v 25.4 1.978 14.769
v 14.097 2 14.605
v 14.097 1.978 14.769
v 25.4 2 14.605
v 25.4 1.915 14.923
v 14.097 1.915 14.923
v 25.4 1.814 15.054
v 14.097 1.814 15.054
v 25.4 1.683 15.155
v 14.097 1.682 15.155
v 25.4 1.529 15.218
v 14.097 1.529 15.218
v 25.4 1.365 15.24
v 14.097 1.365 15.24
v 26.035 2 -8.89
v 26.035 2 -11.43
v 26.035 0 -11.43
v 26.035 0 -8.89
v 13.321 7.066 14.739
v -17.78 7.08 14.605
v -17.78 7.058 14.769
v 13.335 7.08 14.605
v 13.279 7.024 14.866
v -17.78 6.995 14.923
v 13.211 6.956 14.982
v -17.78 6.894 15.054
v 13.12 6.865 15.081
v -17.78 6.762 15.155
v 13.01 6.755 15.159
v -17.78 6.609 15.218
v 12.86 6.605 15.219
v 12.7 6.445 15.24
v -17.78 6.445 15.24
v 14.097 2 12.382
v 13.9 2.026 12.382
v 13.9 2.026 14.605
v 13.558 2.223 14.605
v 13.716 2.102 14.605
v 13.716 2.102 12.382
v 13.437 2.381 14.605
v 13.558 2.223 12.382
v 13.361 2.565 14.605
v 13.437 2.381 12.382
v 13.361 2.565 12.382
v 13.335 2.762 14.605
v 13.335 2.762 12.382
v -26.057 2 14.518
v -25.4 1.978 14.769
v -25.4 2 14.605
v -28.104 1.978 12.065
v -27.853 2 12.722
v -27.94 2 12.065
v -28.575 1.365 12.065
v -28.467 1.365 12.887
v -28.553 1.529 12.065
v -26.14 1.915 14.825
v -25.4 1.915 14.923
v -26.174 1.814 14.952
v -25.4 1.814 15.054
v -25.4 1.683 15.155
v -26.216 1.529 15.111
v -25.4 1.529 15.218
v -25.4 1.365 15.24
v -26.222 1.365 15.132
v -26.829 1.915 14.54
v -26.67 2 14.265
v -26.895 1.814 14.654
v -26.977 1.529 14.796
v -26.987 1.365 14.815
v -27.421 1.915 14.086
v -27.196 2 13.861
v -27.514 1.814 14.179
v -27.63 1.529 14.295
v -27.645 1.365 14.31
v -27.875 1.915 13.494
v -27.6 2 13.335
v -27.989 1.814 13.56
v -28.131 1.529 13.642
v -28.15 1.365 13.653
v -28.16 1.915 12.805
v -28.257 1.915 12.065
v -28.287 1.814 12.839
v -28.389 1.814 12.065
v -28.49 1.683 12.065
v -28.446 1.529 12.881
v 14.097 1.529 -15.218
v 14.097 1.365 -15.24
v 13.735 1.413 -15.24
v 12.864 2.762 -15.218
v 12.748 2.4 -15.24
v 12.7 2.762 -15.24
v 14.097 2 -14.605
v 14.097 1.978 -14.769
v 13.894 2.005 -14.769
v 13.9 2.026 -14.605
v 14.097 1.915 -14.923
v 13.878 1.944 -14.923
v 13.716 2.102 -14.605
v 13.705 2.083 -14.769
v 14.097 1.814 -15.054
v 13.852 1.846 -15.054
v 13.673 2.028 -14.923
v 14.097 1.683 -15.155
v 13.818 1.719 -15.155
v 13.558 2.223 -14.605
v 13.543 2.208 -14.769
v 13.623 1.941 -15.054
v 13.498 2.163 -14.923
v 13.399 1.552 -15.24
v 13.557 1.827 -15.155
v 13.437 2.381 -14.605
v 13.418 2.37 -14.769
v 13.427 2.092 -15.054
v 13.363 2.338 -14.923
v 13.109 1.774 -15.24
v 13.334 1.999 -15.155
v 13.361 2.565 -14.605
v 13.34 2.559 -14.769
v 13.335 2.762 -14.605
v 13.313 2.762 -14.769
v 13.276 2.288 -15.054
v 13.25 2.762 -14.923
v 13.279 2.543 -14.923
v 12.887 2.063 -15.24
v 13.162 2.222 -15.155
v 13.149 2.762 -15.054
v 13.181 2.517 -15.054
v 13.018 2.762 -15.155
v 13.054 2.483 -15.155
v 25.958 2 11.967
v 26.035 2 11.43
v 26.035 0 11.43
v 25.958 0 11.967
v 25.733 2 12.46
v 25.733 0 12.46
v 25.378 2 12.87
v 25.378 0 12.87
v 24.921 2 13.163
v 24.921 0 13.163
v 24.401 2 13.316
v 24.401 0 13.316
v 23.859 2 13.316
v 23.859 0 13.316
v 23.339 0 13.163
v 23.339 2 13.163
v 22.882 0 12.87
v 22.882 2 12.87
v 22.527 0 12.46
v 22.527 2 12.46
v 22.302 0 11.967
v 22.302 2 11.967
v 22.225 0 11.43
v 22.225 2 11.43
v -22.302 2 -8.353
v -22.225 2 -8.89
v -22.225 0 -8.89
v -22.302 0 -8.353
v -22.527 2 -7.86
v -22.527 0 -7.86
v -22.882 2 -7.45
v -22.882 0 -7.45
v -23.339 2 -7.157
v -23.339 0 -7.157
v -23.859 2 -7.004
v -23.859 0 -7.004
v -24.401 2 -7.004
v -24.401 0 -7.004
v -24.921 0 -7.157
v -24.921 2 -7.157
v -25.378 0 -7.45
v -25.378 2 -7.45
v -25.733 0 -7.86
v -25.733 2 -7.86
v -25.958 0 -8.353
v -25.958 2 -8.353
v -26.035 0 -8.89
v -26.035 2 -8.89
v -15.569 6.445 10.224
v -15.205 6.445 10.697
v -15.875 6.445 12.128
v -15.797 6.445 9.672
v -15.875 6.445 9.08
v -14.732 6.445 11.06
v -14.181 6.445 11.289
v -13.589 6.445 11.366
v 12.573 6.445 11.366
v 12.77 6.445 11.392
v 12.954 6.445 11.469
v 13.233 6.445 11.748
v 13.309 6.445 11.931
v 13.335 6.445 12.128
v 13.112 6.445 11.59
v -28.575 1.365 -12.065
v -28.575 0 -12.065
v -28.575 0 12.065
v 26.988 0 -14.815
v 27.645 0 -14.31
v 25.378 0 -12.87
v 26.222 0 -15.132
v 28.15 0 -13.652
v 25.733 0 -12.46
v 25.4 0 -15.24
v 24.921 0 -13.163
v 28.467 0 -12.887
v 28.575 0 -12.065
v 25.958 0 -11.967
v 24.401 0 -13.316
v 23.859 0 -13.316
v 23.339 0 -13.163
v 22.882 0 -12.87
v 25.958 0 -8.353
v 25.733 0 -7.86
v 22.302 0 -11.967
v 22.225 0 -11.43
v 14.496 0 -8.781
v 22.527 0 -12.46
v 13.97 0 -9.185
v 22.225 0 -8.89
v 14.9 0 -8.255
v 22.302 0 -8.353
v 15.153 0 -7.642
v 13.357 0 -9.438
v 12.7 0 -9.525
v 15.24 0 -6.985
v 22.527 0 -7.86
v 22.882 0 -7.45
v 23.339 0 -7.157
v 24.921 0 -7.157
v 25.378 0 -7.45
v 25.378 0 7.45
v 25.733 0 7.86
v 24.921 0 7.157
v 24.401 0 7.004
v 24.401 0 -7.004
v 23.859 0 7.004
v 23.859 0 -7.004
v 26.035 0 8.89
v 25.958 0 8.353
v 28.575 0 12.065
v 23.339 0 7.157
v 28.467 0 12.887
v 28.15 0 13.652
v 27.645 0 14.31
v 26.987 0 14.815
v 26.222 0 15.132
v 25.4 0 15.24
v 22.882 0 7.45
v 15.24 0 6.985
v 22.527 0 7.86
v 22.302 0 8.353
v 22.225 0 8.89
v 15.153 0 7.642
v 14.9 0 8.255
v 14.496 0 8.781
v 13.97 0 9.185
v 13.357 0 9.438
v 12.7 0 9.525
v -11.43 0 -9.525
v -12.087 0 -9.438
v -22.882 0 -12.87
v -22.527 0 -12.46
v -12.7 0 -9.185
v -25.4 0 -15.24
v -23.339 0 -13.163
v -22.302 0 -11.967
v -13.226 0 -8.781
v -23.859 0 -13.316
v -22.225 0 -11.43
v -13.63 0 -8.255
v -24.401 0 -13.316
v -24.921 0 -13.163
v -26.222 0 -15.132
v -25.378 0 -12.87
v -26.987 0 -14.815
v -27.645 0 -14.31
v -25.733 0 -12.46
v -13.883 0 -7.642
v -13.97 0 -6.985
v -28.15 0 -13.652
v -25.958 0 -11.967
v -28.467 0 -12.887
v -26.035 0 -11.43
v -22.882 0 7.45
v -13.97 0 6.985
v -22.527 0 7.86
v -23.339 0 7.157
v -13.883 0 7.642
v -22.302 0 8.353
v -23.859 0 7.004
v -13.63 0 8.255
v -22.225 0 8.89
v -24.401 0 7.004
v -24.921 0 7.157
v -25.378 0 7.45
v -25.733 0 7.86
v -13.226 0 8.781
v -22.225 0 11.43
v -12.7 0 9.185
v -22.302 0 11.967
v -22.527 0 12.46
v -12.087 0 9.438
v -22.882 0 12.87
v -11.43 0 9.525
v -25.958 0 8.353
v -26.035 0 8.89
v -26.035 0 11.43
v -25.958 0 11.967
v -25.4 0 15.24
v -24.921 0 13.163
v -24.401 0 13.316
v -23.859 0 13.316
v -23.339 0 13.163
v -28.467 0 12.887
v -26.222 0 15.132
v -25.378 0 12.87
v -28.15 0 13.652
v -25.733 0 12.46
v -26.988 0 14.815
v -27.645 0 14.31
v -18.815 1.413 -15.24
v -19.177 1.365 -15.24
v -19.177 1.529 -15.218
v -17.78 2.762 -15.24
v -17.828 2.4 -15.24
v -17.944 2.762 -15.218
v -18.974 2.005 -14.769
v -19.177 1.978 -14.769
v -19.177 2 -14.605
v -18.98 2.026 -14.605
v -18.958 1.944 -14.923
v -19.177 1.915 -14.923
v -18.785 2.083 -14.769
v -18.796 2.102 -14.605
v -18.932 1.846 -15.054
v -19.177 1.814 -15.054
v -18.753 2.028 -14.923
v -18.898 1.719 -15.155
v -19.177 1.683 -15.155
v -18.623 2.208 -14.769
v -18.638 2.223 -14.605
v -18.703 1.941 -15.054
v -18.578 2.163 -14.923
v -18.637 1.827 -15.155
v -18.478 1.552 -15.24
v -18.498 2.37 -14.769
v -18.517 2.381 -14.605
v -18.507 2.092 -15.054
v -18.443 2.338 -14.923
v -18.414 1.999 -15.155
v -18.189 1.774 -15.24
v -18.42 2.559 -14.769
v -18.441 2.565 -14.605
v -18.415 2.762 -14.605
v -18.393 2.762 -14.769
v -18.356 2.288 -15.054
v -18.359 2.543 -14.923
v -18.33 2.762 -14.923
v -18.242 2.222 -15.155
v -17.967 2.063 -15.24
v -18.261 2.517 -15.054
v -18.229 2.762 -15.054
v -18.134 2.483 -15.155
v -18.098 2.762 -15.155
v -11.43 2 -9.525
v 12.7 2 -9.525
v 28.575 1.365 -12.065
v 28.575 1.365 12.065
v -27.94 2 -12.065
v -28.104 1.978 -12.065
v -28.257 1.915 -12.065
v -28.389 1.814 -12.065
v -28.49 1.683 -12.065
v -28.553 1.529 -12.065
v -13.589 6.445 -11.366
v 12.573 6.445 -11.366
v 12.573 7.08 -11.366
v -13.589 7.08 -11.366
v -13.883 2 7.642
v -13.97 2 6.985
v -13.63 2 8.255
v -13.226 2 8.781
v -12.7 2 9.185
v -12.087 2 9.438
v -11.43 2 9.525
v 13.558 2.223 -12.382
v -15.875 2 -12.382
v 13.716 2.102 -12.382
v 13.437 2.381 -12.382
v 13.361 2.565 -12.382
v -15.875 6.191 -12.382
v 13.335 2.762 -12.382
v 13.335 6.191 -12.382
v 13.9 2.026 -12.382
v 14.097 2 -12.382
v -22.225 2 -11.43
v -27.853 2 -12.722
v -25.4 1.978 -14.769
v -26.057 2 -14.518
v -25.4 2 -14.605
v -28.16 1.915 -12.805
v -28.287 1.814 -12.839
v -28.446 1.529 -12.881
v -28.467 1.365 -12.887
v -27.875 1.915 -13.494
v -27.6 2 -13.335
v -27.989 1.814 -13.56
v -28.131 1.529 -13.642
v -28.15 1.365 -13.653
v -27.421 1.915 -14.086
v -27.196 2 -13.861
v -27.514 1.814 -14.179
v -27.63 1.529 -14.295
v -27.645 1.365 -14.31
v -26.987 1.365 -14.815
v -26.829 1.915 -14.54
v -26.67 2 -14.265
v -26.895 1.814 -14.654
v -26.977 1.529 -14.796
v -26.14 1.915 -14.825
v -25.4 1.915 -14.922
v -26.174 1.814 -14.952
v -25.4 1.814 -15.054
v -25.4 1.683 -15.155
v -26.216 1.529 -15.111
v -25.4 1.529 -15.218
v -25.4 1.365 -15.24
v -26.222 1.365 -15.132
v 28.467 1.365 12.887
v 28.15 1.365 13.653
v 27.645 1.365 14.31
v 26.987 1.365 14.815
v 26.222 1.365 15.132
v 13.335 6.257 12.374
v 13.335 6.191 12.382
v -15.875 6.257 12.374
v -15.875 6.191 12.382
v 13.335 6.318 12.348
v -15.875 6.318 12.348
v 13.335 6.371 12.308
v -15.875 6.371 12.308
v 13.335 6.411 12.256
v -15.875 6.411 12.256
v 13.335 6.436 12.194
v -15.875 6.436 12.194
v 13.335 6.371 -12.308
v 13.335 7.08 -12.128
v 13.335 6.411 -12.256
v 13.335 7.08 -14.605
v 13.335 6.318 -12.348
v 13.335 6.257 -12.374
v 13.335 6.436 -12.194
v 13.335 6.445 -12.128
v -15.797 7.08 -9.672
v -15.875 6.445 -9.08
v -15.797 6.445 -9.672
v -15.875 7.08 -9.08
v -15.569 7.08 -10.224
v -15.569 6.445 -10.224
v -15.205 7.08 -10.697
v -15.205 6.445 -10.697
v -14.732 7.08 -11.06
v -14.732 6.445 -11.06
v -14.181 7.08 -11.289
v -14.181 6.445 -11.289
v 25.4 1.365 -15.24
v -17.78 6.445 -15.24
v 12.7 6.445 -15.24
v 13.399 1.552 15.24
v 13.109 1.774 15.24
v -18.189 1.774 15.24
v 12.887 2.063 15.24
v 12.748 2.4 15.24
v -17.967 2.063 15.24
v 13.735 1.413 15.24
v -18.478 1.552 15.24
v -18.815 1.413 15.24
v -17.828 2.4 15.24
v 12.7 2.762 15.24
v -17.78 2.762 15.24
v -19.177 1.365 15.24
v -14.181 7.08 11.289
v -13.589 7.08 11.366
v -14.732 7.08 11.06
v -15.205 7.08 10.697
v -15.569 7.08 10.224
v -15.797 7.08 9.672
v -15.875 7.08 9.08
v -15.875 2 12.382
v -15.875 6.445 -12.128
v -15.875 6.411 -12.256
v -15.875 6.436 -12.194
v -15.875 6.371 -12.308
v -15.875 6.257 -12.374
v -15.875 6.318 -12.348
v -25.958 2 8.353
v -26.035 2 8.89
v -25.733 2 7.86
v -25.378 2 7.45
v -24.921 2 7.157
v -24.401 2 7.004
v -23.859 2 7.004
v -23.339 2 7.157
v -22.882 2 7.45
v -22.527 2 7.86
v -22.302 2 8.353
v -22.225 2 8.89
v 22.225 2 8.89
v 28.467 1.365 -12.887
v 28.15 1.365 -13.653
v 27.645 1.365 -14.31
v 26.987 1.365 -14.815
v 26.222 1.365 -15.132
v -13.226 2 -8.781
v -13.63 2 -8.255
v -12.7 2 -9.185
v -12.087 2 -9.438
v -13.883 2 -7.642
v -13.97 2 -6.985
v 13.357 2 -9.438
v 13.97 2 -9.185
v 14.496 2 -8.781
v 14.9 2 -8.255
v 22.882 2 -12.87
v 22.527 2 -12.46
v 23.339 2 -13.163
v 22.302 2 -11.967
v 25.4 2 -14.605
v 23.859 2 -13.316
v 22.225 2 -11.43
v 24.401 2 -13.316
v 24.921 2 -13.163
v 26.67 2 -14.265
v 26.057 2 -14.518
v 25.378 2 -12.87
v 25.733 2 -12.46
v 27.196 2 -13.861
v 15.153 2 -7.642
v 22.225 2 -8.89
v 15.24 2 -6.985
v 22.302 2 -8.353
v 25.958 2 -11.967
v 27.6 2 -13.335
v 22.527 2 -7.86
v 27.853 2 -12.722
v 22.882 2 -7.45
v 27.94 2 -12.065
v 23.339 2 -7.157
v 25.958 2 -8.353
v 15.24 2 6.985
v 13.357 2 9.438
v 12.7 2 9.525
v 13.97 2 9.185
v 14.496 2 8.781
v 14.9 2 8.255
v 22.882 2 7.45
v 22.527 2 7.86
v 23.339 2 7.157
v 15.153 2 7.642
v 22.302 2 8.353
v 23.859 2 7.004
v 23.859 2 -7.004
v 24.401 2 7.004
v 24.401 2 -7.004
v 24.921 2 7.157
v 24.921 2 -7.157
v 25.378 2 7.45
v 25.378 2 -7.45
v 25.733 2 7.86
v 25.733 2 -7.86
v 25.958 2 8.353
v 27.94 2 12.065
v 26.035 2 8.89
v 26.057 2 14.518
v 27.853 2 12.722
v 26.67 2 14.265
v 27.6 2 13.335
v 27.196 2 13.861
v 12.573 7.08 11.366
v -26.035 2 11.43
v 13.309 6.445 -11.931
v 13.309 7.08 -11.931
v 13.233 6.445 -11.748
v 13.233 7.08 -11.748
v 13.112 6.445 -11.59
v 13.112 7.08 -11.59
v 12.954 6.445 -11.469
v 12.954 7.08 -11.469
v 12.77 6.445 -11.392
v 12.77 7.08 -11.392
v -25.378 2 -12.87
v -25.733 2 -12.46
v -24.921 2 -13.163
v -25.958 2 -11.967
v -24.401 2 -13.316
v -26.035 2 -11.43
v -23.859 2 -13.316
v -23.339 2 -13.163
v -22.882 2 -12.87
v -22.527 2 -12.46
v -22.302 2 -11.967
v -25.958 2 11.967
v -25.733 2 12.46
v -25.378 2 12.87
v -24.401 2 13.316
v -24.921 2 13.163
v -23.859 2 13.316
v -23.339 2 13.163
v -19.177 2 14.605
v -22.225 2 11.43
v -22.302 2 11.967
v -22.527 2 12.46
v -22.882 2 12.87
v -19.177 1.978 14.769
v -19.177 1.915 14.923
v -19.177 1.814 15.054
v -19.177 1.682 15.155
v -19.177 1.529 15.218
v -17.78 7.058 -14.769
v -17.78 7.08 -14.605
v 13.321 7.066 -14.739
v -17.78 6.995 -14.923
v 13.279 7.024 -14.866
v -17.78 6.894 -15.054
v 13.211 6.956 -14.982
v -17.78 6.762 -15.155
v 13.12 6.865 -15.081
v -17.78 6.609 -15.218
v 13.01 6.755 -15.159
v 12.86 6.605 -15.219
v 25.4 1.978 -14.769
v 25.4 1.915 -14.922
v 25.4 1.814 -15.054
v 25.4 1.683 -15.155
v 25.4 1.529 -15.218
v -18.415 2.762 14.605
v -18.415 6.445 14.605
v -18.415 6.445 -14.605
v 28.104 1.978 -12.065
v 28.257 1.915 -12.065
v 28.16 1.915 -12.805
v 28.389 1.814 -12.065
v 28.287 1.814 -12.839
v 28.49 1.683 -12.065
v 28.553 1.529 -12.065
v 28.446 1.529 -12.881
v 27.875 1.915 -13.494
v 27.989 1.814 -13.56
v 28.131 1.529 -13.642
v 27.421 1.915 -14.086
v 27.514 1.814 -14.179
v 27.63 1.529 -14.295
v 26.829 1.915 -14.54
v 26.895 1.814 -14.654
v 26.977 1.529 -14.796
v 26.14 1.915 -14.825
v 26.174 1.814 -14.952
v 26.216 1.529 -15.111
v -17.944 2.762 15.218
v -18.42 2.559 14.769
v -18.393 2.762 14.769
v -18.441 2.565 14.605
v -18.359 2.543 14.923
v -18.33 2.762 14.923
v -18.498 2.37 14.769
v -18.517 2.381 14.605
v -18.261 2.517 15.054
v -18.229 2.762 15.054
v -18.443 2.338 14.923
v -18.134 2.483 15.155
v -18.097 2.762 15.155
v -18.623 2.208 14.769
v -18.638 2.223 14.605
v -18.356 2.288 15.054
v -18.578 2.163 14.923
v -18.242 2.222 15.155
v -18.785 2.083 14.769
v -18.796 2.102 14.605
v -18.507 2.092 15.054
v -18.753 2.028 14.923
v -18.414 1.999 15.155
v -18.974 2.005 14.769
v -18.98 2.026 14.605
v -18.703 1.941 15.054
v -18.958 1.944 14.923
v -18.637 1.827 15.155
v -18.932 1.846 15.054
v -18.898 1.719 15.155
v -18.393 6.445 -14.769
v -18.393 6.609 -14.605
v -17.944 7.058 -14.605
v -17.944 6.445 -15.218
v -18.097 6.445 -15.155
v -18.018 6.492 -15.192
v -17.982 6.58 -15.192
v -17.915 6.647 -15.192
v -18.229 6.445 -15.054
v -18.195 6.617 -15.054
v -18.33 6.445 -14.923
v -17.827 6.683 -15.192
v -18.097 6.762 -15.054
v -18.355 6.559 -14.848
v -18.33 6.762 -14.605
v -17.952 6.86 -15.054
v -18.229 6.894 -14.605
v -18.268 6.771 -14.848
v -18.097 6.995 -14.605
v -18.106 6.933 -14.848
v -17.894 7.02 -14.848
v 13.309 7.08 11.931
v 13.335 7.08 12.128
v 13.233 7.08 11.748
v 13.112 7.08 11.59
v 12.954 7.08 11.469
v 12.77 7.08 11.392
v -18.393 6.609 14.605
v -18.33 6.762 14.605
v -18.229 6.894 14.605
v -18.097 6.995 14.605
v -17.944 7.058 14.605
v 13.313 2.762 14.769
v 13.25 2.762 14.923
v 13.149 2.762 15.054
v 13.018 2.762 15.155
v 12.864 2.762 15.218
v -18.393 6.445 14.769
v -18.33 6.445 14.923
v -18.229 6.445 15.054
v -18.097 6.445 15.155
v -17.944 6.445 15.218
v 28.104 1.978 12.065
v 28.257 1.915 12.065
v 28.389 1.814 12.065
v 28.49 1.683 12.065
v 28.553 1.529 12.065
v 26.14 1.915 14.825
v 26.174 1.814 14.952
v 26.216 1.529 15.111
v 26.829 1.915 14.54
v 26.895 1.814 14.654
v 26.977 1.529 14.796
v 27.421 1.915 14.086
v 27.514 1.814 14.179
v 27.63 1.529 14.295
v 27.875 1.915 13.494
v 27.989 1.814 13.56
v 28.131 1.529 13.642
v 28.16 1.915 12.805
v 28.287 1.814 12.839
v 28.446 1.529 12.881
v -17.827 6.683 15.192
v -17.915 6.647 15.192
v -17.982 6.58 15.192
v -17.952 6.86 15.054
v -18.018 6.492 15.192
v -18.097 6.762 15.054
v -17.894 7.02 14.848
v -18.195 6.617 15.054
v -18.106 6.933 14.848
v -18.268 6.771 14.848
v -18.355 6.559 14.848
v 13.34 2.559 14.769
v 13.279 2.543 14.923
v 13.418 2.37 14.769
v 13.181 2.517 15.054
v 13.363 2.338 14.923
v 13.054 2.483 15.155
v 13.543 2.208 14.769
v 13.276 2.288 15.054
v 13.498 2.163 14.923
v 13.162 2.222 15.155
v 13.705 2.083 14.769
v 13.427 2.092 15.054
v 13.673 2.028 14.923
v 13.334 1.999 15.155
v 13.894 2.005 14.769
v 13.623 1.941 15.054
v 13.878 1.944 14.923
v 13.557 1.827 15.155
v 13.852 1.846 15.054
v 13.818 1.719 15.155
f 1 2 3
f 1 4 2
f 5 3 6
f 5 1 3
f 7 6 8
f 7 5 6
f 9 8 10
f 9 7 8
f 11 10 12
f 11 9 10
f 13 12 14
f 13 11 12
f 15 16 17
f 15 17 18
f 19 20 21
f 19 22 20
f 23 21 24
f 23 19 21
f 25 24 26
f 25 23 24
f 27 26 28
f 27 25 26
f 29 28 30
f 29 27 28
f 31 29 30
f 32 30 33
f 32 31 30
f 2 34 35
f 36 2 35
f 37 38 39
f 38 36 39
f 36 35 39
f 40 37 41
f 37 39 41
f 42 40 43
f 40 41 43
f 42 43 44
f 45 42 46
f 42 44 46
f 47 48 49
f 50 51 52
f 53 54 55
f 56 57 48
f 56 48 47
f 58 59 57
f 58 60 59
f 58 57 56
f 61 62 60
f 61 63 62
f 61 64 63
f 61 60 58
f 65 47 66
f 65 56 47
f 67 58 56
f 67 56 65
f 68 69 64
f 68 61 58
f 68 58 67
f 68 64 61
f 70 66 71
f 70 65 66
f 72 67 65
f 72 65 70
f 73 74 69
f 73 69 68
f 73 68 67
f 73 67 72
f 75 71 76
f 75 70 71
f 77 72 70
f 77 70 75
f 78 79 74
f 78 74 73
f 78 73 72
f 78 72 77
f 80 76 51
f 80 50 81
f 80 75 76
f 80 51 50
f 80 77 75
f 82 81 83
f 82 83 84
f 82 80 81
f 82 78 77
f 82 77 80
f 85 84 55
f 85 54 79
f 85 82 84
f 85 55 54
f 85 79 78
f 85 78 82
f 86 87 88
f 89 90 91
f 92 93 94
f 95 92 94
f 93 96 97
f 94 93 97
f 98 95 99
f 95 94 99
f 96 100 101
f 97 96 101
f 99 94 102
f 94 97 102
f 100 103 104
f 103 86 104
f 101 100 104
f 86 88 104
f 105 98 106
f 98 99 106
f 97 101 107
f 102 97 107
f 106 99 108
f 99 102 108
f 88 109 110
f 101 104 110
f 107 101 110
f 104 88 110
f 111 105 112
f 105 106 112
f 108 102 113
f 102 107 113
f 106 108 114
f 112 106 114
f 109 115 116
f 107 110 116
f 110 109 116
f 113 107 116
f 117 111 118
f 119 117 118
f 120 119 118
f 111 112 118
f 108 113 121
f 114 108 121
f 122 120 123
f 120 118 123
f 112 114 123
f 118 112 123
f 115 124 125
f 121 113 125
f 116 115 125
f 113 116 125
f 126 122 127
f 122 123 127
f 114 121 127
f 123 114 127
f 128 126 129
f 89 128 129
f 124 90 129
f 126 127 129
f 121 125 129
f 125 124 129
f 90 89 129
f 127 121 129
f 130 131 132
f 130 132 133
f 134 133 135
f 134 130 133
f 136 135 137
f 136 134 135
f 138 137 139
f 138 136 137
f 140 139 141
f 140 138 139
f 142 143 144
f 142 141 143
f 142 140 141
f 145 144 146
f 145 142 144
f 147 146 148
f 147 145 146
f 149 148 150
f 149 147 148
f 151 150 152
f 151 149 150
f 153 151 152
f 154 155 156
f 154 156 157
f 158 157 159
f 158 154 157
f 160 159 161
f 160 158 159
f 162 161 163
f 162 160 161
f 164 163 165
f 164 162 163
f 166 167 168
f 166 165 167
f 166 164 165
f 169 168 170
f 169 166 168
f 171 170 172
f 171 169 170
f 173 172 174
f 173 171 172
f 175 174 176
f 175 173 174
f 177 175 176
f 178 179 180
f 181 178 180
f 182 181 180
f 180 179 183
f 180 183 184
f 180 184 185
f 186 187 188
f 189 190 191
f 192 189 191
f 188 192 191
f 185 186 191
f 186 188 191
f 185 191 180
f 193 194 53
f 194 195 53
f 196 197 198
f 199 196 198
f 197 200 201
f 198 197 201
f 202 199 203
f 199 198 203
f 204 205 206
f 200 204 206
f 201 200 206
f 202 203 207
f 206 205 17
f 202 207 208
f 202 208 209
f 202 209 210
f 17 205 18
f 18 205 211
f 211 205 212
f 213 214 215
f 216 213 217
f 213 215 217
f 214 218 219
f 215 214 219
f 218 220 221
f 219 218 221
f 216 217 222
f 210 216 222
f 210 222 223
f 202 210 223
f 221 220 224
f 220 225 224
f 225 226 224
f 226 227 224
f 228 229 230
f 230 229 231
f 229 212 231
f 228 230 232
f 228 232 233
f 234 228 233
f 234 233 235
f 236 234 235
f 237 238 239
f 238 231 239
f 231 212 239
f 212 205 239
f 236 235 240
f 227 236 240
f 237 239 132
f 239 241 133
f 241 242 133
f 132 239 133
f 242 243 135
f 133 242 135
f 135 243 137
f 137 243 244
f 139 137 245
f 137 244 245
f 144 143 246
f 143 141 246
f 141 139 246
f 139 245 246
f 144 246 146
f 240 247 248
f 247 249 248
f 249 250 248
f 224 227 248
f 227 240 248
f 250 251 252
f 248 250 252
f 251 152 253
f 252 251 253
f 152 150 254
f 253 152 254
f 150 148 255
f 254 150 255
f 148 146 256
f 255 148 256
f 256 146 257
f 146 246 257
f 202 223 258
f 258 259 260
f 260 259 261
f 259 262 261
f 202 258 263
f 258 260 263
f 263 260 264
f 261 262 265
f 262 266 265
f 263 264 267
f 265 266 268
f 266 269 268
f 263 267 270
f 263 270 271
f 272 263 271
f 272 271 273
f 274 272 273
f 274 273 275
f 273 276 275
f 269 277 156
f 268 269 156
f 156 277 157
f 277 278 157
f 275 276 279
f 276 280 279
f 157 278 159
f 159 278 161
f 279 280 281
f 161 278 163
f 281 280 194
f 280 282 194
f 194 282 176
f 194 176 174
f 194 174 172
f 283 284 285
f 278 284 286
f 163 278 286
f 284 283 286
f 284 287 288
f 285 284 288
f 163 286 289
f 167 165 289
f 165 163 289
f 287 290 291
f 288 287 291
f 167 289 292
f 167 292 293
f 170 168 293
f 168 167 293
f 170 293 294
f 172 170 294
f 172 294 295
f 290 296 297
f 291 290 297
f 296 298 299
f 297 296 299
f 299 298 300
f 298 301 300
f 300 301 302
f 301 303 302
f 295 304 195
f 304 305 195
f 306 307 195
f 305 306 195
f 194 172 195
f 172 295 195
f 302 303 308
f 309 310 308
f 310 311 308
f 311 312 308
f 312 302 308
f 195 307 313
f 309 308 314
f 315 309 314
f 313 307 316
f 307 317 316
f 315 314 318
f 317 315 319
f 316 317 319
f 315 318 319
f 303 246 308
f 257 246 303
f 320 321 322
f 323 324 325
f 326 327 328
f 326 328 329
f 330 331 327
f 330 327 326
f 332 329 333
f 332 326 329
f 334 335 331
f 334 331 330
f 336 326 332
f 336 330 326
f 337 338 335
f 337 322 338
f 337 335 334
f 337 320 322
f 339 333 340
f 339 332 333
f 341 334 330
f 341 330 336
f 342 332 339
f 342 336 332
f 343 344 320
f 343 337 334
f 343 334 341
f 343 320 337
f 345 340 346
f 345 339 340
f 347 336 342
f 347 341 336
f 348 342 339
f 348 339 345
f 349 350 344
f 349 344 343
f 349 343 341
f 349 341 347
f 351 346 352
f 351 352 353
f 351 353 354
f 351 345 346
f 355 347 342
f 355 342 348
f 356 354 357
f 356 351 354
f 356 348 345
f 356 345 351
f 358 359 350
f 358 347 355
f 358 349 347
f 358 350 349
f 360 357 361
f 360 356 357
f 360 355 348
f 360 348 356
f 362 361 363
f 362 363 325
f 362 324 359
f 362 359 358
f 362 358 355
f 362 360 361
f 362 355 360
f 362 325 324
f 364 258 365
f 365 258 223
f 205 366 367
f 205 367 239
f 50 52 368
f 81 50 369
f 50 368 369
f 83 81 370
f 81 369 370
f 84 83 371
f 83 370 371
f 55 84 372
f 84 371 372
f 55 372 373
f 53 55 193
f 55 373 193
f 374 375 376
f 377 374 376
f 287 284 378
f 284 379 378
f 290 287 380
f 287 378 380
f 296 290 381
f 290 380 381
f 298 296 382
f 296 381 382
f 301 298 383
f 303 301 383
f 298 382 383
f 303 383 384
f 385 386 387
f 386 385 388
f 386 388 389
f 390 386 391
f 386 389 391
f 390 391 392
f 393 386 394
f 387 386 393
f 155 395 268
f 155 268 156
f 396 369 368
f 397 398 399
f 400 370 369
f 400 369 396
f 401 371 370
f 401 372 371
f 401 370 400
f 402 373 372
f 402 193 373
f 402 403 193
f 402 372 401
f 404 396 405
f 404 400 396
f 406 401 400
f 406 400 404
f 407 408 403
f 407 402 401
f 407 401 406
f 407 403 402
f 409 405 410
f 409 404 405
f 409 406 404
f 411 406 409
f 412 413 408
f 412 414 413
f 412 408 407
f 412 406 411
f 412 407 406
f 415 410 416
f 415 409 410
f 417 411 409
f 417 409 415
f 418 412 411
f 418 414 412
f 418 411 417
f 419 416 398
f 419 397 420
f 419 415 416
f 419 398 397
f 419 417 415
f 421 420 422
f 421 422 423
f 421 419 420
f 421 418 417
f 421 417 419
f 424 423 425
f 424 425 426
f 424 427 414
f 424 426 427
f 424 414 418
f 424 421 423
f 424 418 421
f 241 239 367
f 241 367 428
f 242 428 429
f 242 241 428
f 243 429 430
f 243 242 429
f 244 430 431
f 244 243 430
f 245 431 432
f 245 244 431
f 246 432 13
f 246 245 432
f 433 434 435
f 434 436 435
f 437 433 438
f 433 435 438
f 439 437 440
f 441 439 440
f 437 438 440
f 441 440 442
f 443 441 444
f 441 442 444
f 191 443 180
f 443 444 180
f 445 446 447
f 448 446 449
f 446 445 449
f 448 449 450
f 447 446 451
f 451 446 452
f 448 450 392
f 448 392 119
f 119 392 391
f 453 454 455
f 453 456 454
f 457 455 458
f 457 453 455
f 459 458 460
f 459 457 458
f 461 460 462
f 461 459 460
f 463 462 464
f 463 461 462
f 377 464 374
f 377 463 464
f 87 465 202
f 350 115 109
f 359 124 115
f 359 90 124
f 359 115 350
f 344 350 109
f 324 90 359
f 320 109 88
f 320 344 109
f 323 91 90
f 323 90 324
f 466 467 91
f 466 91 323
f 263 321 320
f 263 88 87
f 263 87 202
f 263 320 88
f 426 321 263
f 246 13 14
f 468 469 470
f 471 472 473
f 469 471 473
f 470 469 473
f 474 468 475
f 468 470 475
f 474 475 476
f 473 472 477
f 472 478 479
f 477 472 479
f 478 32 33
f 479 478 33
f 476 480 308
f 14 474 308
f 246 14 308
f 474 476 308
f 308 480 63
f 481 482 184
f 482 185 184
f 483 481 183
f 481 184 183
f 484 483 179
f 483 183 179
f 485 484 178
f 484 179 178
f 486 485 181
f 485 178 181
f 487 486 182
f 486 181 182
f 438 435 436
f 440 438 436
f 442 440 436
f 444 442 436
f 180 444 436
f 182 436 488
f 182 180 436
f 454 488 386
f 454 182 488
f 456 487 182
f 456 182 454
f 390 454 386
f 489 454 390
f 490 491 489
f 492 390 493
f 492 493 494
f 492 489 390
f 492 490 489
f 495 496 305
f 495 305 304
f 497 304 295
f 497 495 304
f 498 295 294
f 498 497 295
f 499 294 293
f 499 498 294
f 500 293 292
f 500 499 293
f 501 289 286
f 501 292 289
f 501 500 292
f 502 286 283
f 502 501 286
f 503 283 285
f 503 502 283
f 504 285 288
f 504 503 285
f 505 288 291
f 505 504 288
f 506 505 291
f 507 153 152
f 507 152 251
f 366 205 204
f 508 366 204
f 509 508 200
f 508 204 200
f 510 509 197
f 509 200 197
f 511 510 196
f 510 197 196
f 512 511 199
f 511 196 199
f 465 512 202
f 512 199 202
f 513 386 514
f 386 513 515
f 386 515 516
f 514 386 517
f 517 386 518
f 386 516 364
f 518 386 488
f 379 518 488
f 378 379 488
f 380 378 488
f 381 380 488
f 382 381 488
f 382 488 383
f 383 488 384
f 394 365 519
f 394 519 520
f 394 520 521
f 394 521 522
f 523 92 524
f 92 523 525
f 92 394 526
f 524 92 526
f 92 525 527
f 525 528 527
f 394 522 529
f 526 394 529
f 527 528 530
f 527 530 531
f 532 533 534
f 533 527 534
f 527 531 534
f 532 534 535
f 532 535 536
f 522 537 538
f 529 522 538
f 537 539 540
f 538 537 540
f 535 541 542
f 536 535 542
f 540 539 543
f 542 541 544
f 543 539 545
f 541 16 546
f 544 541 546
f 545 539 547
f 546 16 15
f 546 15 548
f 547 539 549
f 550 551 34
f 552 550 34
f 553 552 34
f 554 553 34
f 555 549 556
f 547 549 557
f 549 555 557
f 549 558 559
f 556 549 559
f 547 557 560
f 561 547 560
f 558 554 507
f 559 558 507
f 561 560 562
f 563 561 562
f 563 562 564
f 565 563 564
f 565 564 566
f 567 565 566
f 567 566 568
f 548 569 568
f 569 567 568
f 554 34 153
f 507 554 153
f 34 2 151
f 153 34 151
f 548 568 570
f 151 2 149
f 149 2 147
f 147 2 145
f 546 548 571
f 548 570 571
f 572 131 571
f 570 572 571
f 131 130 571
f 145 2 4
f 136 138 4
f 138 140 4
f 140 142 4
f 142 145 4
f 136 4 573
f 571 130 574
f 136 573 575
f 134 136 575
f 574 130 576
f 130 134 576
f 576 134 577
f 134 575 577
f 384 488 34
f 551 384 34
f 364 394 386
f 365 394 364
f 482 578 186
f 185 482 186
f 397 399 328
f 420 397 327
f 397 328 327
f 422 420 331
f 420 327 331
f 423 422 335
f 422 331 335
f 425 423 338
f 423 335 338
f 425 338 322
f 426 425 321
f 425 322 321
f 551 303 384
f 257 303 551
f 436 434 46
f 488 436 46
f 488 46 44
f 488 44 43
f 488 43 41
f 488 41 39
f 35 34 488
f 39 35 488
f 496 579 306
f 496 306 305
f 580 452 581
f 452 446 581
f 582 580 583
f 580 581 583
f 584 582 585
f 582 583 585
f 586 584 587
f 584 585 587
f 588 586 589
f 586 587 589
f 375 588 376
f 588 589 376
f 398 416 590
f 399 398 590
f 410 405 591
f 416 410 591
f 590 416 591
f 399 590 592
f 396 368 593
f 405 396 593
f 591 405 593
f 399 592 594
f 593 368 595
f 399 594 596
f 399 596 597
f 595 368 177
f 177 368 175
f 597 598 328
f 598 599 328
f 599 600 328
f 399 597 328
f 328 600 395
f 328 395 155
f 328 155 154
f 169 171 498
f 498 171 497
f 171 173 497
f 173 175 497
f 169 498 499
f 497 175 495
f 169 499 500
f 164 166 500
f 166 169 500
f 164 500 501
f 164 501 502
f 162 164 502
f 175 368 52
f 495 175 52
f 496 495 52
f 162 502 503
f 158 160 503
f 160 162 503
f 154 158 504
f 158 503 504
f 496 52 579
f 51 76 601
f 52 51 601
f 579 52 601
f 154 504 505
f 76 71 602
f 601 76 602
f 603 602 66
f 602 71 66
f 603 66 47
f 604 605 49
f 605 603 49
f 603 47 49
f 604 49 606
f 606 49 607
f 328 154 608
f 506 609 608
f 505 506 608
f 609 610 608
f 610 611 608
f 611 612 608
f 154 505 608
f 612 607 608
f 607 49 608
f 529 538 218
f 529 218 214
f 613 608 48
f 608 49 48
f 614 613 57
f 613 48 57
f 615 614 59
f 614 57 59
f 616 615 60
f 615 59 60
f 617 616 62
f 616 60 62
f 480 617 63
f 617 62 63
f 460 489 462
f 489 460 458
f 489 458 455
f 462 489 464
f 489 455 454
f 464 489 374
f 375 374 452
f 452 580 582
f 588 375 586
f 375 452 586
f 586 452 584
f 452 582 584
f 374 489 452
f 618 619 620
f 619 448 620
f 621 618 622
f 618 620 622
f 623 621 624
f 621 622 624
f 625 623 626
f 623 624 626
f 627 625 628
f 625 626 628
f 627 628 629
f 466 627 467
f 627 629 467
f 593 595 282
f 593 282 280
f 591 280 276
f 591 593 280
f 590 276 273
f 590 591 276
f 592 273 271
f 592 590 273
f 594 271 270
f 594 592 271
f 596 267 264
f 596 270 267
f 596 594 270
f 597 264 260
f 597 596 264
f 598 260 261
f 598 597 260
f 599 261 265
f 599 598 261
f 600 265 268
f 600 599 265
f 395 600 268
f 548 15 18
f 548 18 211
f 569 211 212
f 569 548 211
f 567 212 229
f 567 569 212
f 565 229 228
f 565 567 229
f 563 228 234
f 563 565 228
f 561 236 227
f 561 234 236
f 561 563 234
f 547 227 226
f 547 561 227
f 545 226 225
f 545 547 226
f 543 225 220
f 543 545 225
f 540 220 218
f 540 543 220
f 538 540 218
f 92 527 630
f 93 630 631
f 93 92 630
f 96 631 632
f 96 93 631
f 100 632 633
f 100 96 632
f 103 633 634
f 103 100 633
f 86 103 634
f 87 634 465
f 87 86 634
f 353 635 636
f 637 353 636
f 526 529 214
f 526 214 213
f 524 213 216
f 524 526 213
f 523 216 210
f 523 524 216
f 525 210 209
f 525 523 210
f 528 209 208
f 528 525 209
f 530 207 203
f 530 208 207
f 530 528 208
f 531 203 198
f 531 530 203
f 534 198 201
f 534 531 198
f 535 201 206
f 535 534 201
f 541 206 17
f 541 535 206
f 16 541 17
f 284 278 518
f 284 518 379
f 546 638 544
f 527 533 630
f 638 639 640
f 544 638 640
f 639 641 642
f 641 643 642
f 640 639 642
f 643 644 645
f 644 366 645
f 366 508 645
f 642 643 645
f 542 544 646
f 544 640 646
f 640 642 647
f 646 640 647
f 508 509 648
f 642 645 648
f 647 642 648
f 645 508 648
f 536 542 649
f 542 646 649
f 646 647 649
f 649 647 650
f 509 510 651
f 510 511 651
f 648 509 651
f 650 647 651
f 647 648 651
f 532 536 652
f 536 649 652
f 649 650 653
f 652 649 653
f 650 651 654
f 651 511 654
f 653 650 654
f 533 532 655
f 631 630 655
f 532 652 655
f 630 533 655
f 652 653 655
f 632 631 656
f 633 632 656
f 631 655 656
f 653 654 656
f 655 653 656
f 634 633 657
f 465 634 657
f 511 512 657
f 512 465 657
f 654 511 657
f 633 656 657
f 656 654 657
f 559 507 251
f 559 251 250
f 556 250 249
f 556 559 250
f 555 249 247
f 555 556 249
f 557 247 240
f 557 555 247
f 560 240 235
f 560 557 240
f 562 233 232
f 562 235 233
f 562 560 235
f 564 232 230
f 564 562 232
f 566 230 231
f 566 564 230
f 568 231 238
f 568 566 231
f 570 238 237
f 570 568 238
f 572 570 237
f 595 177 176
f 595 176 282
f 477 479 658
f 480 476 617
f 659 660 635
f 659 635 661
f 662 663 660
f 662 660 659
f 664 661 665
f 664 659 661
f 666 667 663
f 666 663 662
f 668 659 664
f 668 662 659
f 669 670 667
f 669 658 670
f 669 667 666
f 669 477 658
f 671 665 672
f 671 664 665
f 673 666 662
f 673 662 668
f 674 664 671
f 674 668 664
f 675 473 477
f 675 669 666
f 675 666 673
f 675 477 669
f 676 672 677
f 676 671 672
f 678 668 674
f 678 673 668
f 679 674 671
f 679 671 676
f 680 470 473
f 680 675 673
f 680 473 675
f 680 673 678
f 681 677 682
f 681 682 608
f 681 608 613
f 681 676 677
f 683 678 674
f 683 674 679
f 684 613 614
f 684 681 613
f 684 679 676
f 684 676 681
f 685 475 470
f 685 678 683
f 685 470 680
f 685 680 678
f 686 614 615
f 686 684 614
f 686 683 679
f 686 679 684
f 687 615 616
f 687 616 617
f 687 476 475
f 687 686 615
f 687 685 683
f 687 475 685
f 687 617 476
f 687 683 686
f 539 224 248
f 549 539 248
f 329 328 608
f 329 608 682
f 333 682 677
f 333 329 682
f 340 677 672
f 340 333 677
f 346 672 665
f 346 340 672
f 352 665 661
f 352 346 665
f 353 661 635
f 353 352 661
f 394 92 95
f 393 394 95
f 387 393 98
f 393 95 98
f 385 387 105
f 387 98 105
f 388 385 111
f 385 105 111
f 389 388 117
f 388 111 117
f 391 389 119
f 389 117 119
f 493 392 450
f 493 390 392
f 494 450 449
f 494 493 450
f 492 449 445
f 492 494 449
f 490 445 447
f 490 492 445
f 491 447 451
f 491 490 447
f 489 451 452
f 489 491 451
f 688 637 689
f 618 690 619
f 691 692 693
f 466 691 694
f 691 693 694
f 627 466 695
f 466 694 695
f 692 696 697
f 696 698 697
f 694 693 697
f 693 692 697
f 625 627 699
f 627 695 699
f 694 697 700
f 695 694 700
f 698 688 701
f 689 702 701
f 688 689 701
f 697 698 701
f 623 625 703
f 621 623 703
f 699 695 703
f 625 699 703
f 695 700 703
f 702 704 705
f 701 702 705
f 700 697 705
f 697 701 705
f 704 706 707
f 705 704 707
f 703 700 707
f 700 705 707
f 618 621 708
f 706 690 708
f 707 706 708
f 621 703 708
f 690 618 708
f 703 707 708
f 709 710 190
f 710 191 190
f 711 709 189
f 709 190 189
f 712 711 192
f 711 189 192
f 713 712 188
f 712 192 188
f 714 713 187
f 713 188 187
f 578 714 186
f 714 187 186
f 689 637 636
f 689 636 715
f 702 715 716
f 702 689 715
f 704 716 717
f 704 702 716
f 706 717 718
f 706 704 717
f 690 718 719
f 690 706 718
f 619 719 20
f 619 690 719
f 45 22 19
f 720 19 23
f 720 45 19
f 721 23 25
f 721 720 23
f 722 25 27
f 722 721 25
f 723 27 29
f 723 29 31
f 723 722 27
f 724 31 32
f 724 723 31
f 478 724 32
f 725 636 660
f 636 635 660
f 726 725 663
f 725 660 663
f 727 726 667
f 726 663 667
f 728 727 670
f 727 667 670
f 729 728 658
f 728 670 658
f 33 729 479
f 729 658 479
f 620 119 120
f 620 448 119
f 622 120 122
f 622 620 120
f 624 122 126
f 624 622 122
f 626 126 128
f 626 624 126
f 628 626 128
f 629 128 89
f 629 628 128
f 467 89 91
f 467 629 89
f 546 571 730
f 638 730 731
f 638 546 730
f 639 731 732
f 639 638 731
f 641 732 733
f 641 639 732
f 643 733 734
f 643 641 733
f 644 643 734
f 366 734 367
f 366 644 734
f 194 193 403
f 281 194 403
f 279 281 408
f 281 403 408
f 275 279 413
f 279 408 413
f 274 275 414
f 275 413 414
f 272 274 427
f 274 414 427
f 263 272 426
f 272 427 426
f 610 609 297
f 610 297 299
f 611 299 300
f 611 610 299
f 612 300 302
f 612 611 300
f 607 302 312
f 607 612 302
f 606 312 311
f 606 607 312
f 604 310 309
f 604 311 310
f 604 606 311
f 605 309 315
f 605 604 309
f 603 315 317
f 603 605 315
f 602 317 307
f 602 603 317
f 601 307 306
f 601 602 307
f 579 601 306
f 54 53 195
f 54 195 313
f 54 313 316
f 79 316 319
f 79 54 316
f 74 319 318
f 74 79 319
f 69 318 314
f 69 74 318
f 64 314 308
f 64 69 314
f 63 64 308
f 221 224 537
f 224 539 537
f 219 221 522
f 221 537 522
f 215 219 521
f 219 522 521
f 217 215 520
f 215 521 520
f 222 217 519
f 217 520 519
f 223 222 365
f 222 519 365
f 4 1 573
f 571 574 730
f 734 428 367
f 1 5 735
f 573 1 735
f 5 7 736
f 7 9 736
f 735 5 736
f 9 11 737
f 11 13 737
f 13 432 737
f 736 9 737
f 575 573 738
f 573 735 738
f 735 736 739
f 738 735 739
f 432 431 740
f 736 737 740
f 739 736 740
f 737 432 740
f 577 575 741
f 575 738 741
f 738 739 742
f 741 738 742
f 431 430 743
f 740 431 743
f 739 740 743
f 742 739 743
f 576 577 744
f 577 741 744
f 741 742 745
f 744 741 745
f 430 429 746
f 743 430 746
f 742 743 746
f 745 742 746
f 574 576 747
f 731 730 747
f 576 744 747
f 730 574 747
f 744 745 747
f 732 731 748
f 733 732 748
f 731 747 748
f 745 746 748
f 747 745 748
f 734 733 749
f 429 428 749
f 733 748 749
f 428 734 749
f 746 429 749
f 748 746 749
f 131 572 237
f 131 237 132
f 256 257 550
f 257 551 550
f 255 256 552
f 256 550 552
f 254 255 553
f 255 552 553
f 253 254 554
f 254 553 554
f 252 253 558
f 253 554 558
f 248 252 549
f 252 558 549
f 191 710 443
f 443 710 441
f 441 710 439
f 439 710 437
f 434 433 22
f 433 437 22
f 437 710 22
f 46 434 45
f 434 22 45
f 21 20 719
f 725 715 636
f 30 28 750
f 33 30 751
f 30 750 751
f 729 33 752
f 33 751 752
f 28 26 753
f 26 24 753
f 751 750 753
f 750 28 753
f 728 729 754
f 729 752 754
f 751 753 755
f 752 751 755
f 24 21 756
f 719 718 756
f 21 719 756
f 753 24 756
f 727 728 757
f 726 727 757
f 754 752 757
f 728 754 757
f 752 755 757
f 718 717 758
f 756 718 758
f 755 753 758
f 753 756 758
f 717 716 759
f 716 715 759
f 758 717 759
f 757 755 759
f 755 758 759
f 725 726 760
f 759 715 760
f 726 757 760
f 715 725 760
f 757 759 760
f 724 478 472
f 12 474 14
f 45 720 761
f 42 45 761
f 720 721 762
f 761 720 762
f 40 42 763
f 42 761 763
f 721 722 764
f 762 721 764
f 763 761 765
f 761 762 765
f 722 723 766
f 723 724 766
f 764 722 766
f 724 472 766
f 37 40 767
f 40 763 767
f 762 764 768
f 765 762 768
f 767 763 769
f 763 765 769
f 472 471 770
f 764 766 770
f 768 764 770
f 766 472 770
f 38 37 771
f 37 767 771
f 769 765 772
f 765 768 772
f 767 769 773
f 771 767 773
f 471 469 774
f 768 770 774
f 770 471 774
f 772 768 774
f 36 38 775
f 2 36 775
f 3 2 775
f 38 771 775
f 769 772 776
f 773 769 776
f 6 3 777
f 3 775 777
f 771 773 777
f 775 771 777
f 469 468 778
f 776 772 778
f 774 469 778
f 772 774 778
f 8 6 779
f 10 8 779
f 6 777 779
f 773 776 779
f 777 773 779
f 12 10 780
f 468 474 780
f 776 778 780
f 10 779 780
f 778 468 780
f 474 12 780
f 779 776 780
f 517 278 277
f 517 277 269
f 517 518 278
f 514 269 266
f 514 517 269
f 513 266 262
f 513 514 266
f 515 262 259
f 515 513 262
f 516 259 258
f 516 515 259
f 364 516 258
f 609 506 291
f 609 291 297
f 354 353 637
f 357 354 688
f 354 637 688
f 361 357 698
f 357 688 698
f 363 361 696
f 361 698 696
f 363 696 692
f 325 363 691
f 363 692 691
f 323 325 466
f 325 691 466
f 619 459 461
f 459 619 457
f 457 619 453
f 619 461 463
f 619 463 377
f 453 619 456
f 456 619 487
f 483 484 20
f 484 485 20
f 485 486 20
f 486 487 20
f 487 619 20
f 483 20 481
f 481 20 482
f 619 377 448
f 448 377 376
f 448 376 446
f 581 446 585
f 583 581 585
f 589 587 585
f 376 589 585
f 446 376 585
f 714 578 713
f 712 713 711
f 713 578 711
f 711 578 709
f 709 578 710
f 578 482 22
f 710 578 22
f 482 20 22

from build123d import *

# Parameters (mm, degrees)
BOSS_EXTRUDE1_DEPTH = 15.24
CUT_EXTRUDE1_DEPTH  = 19.05
CUT_EXTRUDE2_DEPTH  = 29.21
CUT_EXTRUDE4_REACH  = 35.15
SKETCH7_W           = 29.21
SKETCH7_H           = 19.05
FILLET3_R           = 2.54
FILLET6_R           = 0.762
FILLET7_R           = 2.286
FILLET9_R           = 3.175
FILLET10_R          = 0.762
FILLET11_R          = 0.635
FILLET12_R          = 0.254


with BuildPart() as part:
    # Sketch1 → Boss-Extrude1 (new, symmetric)
    with BuildSketch(Plane.XY):
        Polygon((-28.575, 0), (-28.575, 2), (-18.415, 2), (-18.415, 7.08), (13.335, 7.08), (13.335, 2), (28.575, 2), (28.575, 0), align=None)
    extrude(amount=BOSS_EXTRUDE1_DEPTH, both=True)

    # Sketch4 → Cut-Extrude1 (cut)
    with BuildSketch(Plane(origin=(0, 2, 0), x_dir=(1, 0, 0), z_dir=(0, 1, 0))):
        with BuildLine():
            Line((26.035, 11.43), (26.035, 8.89))
            ThreePointArc((26.035, 8.89), (24.13, 6.985), (22.225, 8.89))
            Line((22.225, 8.89), (22.225, 11.43))
            ThreePointArc((22.225, 11.43), (24.13, 13.335), (26.035, 11.43))
        make_face()
        with BuildLine():
            Line((26.035, -8.89), (26.035, -11.43))
            ThreePointArc((26.035, -11.43), (24.13, -13.335), (22.225, -11.43))
            Line((22.225, -11.43), (22.225, -8.89))
            ThreePointArc((22.225, -8.89), (24.13, -6.985), (26.035, -8.89))
        make_face()
        with BuildLine():
            Line((-22.225, 11.43), (-22.225, 8.89))
            ThreePointArc((-22.225, 8.89), (-24.13, 6.985), (-26.035, 8.89))
            Line((-26.035, 8.89), (-26.035, 11.43))
            ThreePointArc((-26.035, 11.43), (-24.13, 13.335), (-22.225, 11.43))
        make_face()
        with BuildLine():
            Line((-22.225, -8.89), (-22.225, -11.43))
            ThreePointArc((-22.225, -11.43), (-24.13, -13.335), (-26.035, -11.43))
            Line((-26.035, -11.43), (-26.035, -8.89))
            ThreePointArc((-26.035, -8.89), (-24.13, -6.985), (-22.225, -8.89))
        make_face()
    extrude(amount=-CUT_EXTRUDE1_DEPTH, mode=Mode.SUBTRACT)

    # Sketch5 → Cut-Extrude2 (cut)
    with BuildSketch(Plane(origin=(13.335, 0, 0), x_dir=(0, 0, -1), z_dir=(1, 0, 0))):
        Polygon((-12.3825, 2), (12.3825, 2), (12.3825, 6.445), (11.3665, 6.445), (11.3665, 7.08), (-11.3665, 7.08), (-11.3665, 6.445), (-12.3825, 6.445), align=None)
    extrude(amount=-CUT_EXTRUDE2_DEPTH, mode=Mode.SUBTRACT)

    # Sketch7 → Cut-Extrude4 (cut, up to next)
    with BuildSketch(Plane.XZ, mode=Mode.PRIVATE) as cut_extrude4_sk1:
        with Locations((0.635, 0)):
            Rectangle(SKETCH7_W, SKETCH7_H)
    cut_extrude4_tool1 = extrude(cut_extrude4_sk1.sketch, amount=-CUT_EXTRUDE4_REACH, mode=Mode.PRIVATE) & part.part
    add(cut_extrude4_tool1.solids().sort_by_distance((0.635, 0, 0))[0], mode=Mode.SUBTRACT)

    # Fillet3
    fillet3_edges = [part.edges().sort_by_distance(p)[0] for p in [
        (15.24, 1, 9.525),
        (15.24, 1, -9.525),
        (-13.97, 1, -9.525),
        (-13.97, 1, 9.525),
    ]]
    fillet(fillet3_edges, radius=FILLET3_R)

    # Fillet6
    fillet6_edges = [part.edges().sort_by_distance(p)[0] for p in [
        (13.335, 6.7625, -11.3665),
        (13.335, 6.7625, 11.3665),
    ]]
    fillet(fillet6_edges, radius=FILLET6_R)

    # Fillet7
    fillet7_edges = [part.edges().sort_by_distance(p)[0] for p in [
        (-15.875, 6.7625, 11.3665),
        (-15.875, 6.7625, -11.3665),
    ]]
    fillet(fillet7_edges, radius=FILLET7_R)

    # Fillet9
    fillet9_edges = [part.edges().sort_by_distance(p)[0] for p in [
        (28.575, 1, -15.24),
        (-28.575, 1, 15.24),
        (-28.575, 1, -15.24),
        (28.575, 1, 15.24),
    ]]
    fillet(fillet9_edges, radius=FILLET9_R)

    # Fillet10
    fillet10_edges = [part.edges().sort_by_distance(p)[0] for p in [
        (13.335, 2, -13.81125),
        (-18.415, 2, 0),
        (13.335, 2, 13.81125),
    ]]
    fillet(fillet10_edges, radius=FILLET10_R)

    # Fillet11
    fillet11_edges = [part.edges().sort_by_distance(p)[0] for p in [
        (-18.415, 7.08, 0),
        (-2.54, 7.08, 15.24),
        (19.7485, 2, 15.24),
        (-28.575, 2, 0),
        (-27.64506403, 2, -14.31006403),
        (-27.64506403, 2, 14.31006403),
        (19.7485, 2, -15.24),
        (28.575, 2, 0),
        (27.64506403, 2, -14.31006403),
        (27.64506403, 2, 14.31006403),
        (13.335, 4.921, 15.24),
        (13.335, 4.921, -15.24),
        (-22.2885, 2, 15.24),
        (-18.415, 4.921, 15.24),
        (-22.2885, 2, -15.24),
        (13.558184633, 2.223184633, 15.24),
        (13.558184633, 2.223184633, -15.24),
        (-18.638184633, 2.223184633, -15.24),
        (-18.638184633, 2.223184633, 15.24),
        (-18.415, 4.921, -15.24),
        (-2.54, 7.08, -15.24),
    ]]
    fillet(fillet11_edges, radius=FILLET11_R)

    # Fillet12
    fillet12_edges = [part.edges().sort_by_distance(p)[0] for p in [
        (-1.27, 6.445, -12.3825),
        (-1.27, 6.445, 12.3825),
    ]]
    fillet(fillet12_edges, radius=FILLET12_R)


solid = part.part
